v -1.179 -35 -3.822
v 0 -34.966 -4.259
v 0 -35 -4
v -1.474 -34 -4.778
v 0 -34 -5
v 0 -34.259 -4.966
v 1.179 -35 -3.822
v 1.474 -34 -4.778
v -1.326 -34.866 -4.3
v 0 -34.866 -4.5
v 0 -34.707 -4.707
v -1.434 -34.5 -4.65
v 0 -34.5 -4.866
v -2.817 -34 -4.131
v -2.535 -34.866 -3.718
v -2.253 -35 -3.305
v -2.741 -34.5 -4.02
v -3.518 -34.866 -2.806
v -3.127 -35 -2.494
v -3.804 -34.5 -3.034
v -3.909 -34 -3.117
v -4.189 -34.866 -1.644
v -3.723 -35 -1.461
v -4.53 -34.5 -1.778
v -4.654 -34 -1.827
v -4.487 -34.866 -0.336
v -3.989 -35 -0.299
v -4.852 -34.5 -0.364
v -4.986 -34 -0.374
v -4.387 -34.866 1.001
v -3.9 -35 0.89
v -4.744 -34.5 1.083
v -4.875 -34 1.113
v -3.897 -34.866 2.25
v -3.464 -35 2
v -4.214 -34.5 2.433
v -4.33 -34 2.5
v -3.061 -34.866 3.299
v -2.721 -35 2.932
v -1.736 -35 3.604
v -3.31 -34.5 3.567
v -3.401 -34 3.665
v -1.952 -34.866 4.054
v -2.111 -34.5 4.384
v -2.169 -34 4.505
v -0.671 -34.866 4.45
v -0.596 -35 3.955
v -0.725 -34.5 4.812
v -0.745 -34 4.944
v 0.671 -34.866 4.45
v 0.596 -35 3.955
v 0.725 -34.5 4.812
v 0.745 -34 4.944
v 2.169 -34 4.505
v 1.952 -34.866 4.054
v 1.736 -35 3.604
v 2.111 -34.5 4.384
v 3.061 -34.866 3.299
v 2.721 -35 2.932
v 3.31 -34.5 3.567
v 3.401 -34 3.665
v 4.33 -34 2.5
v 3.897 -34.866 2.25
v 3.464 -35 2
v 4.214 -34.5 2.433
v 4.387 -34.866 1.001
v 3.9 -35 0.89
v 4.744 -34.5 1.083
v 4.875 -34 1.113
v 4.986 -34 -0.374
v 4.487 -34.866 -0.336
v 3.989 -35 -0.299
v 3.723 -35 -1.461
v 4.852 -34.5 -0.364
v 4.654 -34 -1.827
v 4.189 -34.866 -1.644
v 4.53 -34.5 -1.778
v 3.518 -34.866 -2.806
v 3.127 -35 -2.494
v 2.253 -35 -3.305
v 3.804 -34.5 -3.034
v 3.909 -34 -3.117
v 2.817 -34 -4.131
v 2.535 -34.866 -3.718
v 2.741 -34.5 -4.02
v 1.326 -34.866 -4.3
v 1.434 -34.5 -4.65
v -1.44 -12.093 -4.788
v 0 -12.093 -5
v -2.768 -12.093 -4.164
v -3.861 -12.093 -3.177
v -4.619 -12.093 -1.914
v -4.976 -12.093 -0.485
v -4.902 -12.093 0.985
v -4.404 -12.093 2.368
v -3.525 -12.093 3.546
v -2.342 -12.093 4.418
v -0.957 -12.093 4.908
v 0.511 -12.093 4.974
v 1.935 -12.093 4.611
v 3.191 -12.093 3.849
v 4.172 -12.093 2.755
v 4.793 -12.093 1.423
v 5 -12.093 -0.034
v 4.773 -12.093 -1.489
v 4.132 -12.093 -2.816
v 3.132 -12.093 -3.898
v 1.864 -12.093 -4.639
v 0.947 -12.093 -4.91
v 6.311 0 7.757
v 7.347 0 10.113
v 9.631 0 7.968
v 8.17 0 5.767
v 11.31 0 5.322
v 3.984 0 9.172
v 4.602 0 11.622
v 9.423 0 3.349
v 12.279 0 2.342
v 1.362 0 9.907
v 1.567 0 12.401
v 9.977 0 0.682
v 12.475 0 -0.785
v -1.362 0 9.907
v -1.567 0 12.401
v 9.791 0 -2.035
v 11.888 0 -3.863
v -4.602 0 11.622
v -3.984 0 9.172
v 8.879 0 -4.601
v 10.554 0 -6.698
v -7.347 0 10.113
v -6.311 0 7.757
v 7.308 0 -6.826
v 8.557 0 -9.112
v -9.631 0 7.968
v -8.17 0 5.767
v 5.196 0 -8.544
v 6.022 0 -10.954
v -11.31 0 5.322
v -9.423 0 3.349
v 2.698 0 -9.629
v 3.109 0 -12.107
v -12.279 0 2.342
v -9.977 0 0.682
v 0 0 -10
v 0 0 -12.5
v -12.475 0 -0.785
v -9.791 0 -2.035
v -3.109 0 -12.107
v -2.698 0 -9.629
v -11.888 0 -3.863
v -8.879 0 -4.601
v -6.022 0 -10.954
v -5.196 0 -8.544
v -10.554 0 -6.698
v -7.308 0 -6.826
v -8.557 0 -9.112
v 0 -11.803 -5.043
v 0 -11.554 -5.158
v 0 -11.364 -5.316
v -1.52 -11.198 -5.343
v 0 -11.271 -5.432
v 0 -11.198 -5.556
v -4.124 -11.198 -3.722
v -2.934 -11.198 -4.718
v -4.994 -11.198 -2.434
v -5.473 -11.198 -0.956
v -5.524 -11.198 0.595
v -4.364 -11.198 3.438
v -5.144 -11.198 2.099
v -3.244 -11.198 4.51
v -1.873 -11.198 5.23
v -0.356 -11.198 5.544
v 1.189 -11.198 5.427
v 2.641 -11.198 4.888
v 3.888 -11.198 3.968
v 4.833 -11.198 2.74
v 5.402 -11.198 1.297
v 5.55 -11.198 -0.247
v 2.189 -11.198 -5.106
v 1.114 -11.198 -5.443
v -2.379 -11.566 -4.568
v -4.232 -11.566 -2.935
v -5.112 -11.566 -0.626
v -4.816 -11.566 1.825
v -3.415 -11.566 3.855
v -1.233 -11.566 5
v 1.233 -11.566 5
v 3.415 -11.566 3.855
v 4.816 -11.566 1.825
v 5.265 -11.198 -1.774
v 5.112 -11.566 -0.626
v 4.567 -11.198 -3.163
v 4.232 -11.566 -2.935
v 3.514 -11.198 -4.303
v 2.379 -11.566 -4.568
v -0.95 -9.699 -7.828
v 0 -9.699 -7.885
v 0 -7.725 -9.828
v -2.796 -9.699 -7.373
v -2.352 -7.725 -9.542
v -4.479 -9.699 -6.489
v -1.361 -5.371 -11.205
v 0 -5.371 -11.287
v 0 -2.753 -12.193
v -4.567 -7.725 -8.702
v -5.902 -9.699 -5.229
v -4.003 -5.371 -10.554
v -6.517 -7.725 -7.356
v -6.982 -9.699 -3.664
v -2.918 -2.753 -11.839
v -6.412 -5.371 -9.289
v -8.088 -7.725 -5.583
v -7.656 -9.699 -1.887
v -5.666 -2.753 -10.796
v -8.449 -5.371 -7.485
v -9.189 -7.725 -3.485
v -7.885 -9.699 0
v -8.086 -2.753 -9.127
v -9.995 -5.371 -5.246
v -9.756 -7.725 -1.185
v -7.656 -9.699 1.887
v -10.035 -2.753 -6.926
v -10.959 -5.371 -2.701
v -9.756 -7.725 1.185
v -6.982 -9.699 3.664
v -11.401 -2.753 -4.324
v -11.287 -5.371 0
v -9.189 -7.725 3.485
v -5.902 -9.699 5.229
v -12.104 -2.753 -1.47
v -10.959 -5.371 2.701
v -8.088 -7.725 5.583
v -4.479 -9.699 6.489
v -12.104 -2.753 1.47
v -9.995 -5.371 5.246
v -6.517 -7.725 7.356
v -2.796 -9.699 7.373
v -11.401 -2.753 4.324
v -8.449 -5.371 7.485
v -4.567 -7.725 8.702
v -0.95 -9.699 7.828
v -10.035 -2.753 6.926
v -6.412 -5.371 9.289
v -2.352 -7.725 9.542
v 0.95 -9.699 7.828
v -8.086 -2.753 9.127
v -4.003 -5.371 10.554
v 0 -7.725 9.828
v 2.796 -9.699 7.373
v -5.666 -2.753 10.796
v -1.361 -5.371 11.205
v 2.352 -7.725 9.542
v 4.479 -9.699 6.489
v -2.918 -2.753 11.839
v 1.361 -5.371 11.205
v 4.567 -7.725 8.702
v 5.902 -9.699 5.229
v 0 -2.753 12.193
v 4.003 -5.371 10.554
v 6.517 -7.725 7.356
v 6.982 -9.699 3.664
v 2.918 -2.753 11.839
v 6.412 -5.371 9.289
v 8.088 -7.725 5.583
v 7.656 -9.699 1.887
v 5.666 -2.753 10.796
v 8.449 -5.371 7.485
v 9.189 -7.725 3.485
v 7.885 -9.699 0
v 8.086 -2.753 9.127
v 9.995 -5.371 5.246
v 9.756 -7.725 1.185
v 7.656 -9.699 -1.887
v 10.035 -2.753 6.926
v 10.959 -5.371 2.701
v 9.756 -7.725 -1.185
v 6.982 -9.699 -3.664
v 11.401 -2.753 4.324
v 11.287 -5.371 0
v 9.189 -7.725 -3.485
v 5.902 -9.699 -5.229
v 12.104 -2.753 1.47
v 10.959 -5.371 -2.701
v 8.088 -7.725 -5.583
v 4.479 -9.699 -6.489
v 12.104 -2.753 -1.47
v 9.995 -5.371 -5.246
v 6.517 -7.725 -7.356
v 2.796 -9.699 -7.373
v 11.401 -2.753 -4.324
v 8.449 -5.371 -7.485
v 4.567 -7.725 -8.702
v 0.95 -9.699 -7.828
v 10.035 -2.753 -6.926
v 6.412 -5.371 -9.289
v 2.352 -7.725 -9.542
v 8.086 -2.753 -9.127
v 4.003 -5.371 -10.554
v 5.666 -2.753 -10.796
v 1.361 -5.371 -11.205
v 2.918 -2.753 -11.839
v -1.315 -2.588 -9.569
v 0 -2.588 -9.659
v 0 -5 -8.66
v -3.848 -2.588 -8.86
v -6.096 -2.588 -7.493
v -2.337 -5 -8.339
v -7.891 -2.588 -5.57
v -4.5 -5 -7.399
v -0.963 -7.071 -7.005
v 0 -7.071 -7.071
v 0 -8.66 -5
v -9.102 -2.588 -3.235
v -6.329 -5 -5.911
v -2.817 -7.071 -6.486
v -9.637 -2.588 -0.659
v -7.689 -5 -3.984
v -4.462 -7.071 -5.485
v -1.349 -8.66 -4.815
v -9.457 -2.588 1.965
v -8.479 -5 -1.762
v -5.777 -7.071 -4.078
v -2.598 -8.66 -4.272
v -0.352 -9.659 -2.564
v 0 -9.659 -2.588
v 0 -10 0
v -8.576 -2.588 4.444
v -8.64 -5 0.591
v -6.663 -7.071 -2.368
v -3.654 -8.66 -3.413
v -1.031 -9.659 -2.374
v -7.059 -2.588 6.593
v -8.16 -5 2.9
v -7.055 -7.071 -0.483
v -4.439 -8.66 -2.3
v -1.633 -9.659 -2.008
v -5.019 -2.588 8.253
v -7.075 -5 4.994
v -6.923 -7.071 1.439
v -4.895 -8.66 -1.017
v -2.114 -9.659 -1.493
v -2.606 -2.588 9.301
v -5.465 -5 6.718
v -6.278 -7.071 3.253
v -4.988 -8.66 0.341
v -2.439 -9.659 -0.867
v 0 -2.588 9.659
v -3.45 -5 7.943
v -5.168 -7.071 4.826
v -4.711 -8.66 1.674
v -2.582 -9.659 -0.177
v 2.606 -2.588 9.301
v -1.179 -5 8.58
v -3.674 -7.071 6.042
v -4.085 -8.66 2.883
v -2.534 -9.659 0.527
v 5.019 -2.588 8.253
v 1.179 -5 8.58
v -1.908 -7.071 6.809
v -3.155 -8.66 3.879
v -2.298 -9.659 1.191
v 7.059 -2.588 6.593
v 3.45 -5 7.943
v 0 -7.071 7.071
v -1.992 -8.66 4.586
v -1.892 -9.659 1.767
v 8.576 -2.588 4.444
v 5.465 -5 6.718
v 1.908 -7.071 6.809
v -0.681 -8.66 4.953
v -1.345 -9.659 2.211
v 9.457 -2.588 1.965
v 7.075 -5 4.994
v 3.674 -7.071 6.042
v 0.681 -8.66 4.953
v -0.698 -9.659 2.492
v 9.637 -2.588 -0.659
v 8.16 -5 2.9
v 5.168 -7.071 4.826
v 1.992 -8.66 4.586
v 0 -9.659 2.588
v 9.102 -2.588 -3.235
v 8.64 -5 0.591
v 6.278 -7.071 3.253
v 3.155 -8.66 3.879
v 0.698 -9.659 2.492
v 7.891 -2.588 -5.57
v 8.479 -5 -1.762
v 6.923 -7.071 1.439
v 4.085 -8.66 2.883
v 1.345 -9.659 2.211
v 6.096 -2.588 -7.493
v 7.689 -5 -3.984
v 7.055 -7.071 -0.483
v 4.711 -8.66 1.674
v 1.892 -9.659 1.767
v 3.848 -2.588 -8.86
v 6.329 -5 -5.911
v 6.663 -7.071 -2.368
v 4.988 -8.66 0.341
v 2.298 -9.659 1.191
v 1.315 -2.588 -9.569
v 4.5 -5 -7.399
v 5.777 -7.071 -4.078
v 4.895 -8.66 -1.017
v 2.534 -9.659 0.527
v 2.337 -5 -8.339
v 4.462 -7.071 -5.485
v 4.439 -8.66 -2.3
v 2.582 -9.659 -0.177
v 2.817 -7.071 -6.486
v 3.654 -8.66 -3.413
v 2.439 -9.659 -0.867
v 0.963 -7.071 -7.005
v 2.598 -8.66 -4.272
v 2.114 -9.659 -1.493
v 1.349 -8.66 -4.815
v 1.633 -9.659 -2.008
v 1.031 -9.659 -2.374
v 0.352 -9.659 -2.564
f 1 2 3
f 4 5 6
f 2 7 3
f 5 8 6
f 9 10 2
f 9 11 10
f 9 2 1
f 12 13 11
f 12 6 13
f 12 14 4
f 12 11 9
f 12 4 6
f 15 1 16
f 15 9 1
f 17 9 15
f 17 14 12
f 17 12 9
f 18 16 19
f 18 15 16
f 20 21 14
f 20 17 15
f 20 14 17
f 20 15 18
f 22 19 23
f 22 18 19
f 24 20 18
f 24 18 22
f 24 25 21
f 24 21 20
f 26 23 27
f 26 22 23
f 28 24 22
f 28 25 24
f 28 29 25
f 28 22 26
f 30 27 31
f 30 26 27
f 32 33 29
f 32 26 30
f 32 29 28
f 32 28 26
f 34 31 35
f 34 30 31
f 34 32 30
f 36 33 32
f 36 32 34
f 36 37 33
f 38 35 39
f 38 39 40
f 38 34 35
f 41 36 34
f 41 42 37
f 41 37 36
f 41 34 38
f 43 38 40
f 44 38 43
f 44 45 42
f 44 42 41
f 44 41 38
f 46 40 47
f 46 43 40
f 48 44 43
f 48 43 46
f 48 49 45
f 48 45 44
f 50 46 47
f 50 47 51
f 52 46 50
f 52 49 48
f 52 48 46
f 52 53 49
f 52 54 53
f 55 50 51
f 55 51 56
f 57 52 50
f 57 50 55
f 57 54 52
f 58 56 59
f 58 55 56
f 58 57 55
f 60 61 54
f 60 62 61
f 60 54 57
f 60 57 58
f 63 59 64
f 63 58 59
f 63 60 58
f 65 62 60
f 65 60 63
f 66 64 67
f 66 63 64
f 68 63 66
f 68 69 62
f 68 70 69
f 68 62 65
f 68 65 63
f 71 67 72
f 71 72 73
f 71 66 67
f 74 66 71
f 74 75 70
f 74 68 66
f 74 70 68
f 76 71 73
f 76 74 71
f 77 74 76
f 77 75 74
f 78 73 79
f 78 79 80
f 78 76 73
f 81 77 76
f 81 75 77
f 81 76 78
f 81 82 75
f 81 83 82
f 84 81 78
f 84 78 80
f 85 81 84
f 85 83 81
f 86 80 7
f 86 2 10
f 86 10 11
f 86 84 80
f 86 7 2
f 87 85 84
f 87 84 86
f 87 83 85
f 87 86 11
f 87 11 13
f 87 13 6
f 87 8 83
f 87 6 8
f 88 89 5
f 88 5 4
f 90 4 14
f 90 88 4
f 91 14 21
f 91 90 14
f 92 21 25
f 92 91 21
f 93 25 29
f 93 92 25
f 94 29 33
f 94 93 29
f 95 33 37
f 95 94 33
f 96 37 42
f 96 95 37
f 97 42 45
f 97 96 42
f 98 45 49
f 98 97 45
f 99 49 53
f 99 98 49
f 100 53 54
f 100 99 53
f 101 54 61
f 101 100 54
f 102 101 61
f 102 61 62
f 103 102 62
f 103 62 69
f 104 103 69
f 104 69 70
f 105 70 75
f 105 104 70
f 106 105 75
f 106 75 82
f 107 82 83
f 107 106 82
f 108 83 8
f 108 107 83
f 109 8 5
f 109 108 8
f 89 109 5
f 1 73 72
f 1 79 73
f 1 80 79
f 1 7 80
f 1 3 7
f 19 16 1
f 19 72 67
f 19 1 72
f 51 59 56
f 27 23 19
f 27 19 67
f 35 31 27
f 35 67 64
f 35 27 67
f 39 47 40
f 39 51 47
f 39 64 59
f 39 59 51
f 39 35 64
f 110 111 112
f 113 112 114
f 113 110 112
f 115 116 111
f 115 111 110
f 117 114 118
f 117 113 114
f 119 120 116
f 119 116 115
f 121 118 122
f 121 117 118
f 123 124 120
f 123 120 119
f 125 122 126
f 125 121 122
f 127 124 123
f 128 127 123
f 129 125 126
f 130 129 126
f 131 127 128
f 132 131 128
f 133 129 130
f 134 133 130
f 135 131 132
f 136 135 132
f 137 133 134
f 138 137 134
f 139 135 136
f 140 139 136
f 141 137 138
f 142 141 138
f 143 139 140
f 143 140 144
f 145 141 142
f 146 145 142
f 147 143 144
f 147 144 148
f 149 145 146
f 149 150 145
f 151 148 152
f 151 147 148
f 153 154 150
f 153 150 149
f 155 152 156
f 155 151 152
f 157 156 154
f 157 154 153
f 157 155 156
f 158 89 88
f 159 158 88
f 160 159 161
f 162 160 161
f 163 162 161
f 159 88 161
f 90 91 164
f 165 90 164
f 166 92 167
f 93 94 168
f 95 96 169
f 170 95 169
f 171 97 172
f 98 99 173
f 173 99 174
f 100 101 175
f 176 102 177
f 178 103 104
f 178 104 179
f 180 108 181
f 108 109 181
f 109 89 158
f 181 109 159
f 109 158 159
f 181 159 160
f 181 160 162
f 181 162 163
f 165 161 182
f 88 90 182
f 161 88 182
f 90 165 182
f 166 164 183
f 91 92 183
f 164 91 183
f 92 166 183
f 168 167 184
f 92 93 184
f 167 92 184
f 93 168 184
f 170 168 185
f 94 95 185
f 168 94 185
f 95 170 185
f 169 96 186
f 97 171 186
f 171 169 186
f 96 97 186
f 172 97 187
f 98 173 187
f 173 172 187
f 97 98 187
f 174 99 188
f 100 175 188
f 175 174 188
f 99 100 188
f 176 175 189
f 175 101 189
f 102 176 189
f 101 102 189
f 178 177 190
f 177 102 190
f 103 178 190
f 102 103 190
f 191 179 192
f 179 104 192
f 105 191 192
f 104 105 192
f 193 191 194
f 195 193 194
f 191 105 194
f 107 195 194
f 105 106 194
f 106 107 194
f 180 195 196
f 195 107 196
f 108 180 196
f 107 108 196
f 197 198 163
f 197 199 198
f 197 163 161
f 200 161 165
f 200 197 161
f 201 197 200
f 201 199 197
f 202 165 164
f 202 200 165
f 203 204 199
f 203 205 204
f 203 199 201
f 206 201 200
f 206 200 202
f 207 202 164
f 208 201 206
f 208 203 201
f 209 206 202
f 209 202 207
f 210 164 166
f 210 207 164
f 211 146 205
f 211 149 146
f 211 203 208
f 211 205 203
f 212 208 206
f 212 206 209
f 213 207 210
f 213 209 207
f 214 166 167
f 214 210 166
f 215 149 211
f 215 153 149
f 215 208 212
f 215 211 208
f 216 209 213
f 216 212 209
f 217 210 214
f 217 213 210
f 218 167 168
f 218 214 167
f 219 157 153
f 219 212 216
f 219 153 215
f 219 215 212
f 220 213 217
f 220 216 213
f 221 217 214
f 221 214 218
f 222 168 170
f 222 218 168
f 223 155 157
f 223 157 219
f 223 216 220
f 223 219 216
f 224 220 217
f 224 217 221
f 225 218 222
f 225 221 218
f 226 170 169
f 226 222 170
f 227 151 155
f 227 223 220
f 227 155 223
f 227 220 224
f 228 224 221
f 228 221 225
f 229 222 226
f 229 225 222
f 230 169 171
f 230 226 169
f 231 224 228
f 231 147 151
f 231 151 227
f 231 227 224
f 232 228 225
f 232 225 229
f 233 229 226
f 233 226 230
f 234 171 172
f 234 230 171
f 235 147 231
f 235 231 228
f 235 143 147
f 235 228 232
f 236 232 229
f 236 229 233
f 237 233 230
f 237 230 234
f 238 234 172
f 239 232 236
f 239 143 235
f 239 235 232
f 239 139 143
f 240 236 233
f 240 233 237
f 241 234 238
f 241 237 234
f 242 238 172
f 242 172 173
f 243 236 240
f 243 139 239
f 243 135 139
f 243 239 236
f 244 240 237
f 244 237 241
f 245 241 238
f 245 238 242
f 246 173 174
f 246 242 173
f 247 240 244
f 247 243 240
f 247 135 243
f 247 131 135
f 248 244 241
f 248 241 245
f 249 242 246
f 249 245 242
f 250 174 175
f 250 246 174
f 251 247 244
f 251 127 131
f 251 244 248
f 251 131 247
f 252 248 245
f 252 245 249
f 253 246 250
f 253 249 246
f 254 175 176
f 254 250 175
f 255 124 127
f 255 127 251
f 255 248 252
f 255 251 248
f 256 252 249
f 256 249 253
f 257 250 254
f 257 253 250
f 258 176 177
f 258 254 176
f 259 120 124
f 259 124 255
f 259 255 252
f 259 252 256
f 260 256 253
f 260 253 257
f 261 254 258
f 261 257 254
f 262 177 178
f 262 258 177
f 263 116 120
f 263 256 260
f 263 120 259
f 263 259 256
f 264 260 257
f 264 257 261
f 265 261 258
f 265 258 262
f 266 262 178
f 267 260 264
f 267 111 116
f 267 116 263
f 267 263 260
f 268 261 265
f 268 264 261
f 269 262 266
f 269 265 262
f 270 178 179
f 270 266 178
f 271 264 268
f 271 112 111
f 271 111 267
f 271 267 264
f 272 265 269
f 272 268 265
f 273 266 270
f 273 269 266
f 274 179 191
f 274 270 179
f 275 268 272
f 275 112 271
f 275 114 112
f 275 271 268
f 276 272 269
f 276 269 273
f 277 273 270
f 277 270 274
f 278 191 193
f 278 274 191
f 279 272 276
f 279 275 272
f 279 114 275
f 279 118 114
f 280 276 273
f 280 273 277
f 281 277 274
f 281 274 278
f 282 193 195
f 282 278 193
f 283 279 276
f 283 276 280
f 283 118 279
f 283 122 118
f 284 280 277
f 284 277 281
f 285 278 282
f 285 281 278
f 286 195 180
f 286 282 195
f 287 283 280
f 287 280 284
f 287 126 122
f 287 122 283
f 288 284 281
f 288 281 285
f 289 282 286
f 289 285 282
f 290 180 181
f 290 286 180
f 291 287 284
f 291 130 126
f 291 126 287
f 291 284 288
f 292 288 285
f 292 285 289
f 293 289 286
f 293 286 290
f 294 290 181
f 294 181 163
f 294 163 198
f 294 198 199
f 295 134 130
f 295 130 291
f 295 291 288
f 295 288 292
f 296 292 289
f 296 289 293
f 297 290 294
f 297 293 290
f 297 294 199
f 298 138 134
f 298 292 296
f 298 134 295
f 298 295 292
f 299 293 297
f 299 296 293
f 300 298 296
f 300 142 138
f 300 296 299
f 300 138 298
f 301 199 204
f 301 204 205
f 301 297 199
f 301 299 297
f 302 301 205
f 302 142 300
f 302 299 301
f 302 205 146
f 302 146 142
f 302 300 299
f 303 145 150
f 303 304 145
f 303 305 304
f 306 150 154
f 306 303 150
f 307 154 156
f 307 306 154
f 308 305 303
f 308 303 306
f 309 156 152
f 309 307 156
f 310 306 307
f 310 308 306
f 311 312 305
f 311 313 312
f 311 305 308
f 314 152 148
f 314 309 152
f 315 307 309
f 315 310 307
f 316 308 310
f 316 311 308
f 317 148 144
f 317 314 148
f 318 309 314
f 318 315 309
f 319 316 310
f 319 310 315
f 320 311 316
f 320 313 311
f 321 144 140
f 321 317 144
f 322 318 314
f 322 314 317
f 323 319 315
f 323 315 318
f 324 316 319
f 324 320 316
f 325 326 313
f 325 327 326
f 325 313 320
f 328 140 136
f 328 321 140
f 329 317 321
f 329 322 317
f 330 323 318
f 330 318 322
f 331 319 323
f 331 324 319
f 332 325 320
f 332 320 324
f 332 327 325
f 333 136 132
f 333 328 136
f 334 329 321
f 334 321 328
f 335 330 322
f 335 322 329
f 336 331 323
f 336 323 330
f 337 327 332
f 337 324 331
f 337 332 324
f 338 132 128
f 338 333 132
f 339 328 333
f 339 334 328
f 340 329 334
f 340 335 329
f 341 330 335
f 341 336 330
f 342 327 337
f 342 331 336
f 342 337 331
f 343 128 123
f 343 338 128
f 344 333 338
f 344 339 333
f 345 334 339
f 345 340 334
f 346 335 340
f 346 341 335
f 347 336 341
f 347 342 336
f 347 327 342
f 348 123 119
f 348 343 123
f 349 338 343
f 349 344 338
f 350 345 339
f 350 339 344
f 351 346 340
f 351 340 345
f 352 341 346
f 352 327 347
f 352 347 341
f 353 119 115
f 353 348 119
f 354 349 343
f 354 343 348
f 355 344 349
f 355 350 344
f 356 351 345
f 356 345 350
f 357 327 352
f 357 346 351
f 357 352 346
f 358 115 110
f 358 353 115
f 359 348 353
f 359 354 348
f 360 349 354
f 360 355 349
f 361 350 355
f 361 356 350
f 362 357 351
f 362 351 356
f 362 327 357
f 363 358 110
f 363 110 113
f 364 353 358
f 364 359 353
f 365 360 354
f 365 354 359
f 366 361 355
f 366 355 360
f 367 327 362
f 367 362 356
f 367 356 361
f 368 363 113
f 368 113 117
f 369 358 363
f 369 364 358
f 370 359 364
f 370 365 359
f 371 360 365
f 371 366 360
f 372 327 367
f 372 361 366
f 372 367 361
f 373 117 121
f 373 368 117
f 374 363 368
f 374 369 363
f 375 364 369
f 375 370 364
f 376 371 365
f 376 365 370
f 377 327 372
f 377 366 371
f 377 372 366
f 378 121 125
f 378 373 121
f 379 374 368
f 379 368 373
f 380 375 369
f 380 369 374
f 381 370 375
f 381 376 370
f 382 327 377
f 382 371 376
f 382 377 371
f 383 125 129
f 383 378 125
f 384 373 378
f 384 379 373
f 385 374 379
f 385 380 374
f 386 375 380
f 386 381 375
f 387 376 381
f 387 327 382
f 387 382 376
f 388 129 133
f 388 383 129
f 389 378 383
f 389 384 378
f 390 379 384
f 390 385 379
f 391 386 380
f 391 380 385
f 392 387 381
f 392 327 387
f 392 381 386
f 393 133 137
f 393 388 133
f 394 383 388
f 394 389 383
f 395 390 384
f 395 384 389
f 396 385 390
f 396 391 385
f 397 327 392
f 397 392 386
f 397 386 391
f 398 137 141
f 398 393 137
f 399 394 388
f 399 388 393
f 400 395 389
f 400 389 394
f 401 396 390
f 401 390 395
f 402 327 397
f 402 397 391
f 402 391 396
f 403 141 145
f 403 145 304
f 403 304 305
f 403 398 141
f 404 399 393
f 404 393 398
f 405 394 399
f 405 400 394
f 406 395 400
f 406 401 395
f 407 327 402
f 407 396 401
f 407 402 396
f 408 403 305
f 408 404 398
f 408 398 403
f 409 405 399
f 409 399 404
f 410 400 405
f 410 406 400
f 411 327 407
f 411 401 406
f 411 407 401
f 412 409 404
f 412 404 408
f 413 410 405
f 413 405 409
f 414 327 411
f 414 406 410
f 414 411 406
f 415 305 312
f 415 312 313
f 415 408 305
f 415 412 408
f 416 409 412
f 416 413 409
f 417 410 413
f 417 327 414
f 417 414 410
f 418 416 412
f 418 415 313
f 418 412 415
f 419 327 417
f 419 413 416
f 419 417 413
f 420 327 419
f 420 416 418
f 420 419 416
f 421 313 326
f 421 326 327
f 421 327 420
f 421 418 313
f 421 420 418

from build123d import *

# Parameters (mm, degrees)
FILLET1_R = 1


with BuildPart() as part:
    # Sketch1 → Revolve2 (revolve)
    with BuildSketch(Plane.XY, mode=Mode.PRIVATE) as revolve2_sk:
        with BuildLine():
            Line((12.5, 0), (10, 0))
            ThreePointArc((10, 0), (7.071067812, -7.071067812), (0, -10))
            Line((0, -10), (0, -35))
            Line((0, -35), (5, -35))
            Line((5, -35), (5, -11.456439237))
            ThreePointArc((5, -11.456439237), (10.458250332, -6.846531969), (12.5, 0))
        make_face()
    revolve(revolve2_sk.sketch.rotate(Axis((0, -11.87690577, 0), (0, 1, 0)), 90), axis=Axis((0, -11.87690577, 0), (0, 1, 0)))

    # Fillet1
    fillet1_edges = [part.edges().sort_by_distance(p)[0] for p in [
        (0, -11.456439237, 5),
        (0, -35, 5),
    ]]
    fillet(fillet1_edges, radius=FILLET1_R)


solid = part.part
